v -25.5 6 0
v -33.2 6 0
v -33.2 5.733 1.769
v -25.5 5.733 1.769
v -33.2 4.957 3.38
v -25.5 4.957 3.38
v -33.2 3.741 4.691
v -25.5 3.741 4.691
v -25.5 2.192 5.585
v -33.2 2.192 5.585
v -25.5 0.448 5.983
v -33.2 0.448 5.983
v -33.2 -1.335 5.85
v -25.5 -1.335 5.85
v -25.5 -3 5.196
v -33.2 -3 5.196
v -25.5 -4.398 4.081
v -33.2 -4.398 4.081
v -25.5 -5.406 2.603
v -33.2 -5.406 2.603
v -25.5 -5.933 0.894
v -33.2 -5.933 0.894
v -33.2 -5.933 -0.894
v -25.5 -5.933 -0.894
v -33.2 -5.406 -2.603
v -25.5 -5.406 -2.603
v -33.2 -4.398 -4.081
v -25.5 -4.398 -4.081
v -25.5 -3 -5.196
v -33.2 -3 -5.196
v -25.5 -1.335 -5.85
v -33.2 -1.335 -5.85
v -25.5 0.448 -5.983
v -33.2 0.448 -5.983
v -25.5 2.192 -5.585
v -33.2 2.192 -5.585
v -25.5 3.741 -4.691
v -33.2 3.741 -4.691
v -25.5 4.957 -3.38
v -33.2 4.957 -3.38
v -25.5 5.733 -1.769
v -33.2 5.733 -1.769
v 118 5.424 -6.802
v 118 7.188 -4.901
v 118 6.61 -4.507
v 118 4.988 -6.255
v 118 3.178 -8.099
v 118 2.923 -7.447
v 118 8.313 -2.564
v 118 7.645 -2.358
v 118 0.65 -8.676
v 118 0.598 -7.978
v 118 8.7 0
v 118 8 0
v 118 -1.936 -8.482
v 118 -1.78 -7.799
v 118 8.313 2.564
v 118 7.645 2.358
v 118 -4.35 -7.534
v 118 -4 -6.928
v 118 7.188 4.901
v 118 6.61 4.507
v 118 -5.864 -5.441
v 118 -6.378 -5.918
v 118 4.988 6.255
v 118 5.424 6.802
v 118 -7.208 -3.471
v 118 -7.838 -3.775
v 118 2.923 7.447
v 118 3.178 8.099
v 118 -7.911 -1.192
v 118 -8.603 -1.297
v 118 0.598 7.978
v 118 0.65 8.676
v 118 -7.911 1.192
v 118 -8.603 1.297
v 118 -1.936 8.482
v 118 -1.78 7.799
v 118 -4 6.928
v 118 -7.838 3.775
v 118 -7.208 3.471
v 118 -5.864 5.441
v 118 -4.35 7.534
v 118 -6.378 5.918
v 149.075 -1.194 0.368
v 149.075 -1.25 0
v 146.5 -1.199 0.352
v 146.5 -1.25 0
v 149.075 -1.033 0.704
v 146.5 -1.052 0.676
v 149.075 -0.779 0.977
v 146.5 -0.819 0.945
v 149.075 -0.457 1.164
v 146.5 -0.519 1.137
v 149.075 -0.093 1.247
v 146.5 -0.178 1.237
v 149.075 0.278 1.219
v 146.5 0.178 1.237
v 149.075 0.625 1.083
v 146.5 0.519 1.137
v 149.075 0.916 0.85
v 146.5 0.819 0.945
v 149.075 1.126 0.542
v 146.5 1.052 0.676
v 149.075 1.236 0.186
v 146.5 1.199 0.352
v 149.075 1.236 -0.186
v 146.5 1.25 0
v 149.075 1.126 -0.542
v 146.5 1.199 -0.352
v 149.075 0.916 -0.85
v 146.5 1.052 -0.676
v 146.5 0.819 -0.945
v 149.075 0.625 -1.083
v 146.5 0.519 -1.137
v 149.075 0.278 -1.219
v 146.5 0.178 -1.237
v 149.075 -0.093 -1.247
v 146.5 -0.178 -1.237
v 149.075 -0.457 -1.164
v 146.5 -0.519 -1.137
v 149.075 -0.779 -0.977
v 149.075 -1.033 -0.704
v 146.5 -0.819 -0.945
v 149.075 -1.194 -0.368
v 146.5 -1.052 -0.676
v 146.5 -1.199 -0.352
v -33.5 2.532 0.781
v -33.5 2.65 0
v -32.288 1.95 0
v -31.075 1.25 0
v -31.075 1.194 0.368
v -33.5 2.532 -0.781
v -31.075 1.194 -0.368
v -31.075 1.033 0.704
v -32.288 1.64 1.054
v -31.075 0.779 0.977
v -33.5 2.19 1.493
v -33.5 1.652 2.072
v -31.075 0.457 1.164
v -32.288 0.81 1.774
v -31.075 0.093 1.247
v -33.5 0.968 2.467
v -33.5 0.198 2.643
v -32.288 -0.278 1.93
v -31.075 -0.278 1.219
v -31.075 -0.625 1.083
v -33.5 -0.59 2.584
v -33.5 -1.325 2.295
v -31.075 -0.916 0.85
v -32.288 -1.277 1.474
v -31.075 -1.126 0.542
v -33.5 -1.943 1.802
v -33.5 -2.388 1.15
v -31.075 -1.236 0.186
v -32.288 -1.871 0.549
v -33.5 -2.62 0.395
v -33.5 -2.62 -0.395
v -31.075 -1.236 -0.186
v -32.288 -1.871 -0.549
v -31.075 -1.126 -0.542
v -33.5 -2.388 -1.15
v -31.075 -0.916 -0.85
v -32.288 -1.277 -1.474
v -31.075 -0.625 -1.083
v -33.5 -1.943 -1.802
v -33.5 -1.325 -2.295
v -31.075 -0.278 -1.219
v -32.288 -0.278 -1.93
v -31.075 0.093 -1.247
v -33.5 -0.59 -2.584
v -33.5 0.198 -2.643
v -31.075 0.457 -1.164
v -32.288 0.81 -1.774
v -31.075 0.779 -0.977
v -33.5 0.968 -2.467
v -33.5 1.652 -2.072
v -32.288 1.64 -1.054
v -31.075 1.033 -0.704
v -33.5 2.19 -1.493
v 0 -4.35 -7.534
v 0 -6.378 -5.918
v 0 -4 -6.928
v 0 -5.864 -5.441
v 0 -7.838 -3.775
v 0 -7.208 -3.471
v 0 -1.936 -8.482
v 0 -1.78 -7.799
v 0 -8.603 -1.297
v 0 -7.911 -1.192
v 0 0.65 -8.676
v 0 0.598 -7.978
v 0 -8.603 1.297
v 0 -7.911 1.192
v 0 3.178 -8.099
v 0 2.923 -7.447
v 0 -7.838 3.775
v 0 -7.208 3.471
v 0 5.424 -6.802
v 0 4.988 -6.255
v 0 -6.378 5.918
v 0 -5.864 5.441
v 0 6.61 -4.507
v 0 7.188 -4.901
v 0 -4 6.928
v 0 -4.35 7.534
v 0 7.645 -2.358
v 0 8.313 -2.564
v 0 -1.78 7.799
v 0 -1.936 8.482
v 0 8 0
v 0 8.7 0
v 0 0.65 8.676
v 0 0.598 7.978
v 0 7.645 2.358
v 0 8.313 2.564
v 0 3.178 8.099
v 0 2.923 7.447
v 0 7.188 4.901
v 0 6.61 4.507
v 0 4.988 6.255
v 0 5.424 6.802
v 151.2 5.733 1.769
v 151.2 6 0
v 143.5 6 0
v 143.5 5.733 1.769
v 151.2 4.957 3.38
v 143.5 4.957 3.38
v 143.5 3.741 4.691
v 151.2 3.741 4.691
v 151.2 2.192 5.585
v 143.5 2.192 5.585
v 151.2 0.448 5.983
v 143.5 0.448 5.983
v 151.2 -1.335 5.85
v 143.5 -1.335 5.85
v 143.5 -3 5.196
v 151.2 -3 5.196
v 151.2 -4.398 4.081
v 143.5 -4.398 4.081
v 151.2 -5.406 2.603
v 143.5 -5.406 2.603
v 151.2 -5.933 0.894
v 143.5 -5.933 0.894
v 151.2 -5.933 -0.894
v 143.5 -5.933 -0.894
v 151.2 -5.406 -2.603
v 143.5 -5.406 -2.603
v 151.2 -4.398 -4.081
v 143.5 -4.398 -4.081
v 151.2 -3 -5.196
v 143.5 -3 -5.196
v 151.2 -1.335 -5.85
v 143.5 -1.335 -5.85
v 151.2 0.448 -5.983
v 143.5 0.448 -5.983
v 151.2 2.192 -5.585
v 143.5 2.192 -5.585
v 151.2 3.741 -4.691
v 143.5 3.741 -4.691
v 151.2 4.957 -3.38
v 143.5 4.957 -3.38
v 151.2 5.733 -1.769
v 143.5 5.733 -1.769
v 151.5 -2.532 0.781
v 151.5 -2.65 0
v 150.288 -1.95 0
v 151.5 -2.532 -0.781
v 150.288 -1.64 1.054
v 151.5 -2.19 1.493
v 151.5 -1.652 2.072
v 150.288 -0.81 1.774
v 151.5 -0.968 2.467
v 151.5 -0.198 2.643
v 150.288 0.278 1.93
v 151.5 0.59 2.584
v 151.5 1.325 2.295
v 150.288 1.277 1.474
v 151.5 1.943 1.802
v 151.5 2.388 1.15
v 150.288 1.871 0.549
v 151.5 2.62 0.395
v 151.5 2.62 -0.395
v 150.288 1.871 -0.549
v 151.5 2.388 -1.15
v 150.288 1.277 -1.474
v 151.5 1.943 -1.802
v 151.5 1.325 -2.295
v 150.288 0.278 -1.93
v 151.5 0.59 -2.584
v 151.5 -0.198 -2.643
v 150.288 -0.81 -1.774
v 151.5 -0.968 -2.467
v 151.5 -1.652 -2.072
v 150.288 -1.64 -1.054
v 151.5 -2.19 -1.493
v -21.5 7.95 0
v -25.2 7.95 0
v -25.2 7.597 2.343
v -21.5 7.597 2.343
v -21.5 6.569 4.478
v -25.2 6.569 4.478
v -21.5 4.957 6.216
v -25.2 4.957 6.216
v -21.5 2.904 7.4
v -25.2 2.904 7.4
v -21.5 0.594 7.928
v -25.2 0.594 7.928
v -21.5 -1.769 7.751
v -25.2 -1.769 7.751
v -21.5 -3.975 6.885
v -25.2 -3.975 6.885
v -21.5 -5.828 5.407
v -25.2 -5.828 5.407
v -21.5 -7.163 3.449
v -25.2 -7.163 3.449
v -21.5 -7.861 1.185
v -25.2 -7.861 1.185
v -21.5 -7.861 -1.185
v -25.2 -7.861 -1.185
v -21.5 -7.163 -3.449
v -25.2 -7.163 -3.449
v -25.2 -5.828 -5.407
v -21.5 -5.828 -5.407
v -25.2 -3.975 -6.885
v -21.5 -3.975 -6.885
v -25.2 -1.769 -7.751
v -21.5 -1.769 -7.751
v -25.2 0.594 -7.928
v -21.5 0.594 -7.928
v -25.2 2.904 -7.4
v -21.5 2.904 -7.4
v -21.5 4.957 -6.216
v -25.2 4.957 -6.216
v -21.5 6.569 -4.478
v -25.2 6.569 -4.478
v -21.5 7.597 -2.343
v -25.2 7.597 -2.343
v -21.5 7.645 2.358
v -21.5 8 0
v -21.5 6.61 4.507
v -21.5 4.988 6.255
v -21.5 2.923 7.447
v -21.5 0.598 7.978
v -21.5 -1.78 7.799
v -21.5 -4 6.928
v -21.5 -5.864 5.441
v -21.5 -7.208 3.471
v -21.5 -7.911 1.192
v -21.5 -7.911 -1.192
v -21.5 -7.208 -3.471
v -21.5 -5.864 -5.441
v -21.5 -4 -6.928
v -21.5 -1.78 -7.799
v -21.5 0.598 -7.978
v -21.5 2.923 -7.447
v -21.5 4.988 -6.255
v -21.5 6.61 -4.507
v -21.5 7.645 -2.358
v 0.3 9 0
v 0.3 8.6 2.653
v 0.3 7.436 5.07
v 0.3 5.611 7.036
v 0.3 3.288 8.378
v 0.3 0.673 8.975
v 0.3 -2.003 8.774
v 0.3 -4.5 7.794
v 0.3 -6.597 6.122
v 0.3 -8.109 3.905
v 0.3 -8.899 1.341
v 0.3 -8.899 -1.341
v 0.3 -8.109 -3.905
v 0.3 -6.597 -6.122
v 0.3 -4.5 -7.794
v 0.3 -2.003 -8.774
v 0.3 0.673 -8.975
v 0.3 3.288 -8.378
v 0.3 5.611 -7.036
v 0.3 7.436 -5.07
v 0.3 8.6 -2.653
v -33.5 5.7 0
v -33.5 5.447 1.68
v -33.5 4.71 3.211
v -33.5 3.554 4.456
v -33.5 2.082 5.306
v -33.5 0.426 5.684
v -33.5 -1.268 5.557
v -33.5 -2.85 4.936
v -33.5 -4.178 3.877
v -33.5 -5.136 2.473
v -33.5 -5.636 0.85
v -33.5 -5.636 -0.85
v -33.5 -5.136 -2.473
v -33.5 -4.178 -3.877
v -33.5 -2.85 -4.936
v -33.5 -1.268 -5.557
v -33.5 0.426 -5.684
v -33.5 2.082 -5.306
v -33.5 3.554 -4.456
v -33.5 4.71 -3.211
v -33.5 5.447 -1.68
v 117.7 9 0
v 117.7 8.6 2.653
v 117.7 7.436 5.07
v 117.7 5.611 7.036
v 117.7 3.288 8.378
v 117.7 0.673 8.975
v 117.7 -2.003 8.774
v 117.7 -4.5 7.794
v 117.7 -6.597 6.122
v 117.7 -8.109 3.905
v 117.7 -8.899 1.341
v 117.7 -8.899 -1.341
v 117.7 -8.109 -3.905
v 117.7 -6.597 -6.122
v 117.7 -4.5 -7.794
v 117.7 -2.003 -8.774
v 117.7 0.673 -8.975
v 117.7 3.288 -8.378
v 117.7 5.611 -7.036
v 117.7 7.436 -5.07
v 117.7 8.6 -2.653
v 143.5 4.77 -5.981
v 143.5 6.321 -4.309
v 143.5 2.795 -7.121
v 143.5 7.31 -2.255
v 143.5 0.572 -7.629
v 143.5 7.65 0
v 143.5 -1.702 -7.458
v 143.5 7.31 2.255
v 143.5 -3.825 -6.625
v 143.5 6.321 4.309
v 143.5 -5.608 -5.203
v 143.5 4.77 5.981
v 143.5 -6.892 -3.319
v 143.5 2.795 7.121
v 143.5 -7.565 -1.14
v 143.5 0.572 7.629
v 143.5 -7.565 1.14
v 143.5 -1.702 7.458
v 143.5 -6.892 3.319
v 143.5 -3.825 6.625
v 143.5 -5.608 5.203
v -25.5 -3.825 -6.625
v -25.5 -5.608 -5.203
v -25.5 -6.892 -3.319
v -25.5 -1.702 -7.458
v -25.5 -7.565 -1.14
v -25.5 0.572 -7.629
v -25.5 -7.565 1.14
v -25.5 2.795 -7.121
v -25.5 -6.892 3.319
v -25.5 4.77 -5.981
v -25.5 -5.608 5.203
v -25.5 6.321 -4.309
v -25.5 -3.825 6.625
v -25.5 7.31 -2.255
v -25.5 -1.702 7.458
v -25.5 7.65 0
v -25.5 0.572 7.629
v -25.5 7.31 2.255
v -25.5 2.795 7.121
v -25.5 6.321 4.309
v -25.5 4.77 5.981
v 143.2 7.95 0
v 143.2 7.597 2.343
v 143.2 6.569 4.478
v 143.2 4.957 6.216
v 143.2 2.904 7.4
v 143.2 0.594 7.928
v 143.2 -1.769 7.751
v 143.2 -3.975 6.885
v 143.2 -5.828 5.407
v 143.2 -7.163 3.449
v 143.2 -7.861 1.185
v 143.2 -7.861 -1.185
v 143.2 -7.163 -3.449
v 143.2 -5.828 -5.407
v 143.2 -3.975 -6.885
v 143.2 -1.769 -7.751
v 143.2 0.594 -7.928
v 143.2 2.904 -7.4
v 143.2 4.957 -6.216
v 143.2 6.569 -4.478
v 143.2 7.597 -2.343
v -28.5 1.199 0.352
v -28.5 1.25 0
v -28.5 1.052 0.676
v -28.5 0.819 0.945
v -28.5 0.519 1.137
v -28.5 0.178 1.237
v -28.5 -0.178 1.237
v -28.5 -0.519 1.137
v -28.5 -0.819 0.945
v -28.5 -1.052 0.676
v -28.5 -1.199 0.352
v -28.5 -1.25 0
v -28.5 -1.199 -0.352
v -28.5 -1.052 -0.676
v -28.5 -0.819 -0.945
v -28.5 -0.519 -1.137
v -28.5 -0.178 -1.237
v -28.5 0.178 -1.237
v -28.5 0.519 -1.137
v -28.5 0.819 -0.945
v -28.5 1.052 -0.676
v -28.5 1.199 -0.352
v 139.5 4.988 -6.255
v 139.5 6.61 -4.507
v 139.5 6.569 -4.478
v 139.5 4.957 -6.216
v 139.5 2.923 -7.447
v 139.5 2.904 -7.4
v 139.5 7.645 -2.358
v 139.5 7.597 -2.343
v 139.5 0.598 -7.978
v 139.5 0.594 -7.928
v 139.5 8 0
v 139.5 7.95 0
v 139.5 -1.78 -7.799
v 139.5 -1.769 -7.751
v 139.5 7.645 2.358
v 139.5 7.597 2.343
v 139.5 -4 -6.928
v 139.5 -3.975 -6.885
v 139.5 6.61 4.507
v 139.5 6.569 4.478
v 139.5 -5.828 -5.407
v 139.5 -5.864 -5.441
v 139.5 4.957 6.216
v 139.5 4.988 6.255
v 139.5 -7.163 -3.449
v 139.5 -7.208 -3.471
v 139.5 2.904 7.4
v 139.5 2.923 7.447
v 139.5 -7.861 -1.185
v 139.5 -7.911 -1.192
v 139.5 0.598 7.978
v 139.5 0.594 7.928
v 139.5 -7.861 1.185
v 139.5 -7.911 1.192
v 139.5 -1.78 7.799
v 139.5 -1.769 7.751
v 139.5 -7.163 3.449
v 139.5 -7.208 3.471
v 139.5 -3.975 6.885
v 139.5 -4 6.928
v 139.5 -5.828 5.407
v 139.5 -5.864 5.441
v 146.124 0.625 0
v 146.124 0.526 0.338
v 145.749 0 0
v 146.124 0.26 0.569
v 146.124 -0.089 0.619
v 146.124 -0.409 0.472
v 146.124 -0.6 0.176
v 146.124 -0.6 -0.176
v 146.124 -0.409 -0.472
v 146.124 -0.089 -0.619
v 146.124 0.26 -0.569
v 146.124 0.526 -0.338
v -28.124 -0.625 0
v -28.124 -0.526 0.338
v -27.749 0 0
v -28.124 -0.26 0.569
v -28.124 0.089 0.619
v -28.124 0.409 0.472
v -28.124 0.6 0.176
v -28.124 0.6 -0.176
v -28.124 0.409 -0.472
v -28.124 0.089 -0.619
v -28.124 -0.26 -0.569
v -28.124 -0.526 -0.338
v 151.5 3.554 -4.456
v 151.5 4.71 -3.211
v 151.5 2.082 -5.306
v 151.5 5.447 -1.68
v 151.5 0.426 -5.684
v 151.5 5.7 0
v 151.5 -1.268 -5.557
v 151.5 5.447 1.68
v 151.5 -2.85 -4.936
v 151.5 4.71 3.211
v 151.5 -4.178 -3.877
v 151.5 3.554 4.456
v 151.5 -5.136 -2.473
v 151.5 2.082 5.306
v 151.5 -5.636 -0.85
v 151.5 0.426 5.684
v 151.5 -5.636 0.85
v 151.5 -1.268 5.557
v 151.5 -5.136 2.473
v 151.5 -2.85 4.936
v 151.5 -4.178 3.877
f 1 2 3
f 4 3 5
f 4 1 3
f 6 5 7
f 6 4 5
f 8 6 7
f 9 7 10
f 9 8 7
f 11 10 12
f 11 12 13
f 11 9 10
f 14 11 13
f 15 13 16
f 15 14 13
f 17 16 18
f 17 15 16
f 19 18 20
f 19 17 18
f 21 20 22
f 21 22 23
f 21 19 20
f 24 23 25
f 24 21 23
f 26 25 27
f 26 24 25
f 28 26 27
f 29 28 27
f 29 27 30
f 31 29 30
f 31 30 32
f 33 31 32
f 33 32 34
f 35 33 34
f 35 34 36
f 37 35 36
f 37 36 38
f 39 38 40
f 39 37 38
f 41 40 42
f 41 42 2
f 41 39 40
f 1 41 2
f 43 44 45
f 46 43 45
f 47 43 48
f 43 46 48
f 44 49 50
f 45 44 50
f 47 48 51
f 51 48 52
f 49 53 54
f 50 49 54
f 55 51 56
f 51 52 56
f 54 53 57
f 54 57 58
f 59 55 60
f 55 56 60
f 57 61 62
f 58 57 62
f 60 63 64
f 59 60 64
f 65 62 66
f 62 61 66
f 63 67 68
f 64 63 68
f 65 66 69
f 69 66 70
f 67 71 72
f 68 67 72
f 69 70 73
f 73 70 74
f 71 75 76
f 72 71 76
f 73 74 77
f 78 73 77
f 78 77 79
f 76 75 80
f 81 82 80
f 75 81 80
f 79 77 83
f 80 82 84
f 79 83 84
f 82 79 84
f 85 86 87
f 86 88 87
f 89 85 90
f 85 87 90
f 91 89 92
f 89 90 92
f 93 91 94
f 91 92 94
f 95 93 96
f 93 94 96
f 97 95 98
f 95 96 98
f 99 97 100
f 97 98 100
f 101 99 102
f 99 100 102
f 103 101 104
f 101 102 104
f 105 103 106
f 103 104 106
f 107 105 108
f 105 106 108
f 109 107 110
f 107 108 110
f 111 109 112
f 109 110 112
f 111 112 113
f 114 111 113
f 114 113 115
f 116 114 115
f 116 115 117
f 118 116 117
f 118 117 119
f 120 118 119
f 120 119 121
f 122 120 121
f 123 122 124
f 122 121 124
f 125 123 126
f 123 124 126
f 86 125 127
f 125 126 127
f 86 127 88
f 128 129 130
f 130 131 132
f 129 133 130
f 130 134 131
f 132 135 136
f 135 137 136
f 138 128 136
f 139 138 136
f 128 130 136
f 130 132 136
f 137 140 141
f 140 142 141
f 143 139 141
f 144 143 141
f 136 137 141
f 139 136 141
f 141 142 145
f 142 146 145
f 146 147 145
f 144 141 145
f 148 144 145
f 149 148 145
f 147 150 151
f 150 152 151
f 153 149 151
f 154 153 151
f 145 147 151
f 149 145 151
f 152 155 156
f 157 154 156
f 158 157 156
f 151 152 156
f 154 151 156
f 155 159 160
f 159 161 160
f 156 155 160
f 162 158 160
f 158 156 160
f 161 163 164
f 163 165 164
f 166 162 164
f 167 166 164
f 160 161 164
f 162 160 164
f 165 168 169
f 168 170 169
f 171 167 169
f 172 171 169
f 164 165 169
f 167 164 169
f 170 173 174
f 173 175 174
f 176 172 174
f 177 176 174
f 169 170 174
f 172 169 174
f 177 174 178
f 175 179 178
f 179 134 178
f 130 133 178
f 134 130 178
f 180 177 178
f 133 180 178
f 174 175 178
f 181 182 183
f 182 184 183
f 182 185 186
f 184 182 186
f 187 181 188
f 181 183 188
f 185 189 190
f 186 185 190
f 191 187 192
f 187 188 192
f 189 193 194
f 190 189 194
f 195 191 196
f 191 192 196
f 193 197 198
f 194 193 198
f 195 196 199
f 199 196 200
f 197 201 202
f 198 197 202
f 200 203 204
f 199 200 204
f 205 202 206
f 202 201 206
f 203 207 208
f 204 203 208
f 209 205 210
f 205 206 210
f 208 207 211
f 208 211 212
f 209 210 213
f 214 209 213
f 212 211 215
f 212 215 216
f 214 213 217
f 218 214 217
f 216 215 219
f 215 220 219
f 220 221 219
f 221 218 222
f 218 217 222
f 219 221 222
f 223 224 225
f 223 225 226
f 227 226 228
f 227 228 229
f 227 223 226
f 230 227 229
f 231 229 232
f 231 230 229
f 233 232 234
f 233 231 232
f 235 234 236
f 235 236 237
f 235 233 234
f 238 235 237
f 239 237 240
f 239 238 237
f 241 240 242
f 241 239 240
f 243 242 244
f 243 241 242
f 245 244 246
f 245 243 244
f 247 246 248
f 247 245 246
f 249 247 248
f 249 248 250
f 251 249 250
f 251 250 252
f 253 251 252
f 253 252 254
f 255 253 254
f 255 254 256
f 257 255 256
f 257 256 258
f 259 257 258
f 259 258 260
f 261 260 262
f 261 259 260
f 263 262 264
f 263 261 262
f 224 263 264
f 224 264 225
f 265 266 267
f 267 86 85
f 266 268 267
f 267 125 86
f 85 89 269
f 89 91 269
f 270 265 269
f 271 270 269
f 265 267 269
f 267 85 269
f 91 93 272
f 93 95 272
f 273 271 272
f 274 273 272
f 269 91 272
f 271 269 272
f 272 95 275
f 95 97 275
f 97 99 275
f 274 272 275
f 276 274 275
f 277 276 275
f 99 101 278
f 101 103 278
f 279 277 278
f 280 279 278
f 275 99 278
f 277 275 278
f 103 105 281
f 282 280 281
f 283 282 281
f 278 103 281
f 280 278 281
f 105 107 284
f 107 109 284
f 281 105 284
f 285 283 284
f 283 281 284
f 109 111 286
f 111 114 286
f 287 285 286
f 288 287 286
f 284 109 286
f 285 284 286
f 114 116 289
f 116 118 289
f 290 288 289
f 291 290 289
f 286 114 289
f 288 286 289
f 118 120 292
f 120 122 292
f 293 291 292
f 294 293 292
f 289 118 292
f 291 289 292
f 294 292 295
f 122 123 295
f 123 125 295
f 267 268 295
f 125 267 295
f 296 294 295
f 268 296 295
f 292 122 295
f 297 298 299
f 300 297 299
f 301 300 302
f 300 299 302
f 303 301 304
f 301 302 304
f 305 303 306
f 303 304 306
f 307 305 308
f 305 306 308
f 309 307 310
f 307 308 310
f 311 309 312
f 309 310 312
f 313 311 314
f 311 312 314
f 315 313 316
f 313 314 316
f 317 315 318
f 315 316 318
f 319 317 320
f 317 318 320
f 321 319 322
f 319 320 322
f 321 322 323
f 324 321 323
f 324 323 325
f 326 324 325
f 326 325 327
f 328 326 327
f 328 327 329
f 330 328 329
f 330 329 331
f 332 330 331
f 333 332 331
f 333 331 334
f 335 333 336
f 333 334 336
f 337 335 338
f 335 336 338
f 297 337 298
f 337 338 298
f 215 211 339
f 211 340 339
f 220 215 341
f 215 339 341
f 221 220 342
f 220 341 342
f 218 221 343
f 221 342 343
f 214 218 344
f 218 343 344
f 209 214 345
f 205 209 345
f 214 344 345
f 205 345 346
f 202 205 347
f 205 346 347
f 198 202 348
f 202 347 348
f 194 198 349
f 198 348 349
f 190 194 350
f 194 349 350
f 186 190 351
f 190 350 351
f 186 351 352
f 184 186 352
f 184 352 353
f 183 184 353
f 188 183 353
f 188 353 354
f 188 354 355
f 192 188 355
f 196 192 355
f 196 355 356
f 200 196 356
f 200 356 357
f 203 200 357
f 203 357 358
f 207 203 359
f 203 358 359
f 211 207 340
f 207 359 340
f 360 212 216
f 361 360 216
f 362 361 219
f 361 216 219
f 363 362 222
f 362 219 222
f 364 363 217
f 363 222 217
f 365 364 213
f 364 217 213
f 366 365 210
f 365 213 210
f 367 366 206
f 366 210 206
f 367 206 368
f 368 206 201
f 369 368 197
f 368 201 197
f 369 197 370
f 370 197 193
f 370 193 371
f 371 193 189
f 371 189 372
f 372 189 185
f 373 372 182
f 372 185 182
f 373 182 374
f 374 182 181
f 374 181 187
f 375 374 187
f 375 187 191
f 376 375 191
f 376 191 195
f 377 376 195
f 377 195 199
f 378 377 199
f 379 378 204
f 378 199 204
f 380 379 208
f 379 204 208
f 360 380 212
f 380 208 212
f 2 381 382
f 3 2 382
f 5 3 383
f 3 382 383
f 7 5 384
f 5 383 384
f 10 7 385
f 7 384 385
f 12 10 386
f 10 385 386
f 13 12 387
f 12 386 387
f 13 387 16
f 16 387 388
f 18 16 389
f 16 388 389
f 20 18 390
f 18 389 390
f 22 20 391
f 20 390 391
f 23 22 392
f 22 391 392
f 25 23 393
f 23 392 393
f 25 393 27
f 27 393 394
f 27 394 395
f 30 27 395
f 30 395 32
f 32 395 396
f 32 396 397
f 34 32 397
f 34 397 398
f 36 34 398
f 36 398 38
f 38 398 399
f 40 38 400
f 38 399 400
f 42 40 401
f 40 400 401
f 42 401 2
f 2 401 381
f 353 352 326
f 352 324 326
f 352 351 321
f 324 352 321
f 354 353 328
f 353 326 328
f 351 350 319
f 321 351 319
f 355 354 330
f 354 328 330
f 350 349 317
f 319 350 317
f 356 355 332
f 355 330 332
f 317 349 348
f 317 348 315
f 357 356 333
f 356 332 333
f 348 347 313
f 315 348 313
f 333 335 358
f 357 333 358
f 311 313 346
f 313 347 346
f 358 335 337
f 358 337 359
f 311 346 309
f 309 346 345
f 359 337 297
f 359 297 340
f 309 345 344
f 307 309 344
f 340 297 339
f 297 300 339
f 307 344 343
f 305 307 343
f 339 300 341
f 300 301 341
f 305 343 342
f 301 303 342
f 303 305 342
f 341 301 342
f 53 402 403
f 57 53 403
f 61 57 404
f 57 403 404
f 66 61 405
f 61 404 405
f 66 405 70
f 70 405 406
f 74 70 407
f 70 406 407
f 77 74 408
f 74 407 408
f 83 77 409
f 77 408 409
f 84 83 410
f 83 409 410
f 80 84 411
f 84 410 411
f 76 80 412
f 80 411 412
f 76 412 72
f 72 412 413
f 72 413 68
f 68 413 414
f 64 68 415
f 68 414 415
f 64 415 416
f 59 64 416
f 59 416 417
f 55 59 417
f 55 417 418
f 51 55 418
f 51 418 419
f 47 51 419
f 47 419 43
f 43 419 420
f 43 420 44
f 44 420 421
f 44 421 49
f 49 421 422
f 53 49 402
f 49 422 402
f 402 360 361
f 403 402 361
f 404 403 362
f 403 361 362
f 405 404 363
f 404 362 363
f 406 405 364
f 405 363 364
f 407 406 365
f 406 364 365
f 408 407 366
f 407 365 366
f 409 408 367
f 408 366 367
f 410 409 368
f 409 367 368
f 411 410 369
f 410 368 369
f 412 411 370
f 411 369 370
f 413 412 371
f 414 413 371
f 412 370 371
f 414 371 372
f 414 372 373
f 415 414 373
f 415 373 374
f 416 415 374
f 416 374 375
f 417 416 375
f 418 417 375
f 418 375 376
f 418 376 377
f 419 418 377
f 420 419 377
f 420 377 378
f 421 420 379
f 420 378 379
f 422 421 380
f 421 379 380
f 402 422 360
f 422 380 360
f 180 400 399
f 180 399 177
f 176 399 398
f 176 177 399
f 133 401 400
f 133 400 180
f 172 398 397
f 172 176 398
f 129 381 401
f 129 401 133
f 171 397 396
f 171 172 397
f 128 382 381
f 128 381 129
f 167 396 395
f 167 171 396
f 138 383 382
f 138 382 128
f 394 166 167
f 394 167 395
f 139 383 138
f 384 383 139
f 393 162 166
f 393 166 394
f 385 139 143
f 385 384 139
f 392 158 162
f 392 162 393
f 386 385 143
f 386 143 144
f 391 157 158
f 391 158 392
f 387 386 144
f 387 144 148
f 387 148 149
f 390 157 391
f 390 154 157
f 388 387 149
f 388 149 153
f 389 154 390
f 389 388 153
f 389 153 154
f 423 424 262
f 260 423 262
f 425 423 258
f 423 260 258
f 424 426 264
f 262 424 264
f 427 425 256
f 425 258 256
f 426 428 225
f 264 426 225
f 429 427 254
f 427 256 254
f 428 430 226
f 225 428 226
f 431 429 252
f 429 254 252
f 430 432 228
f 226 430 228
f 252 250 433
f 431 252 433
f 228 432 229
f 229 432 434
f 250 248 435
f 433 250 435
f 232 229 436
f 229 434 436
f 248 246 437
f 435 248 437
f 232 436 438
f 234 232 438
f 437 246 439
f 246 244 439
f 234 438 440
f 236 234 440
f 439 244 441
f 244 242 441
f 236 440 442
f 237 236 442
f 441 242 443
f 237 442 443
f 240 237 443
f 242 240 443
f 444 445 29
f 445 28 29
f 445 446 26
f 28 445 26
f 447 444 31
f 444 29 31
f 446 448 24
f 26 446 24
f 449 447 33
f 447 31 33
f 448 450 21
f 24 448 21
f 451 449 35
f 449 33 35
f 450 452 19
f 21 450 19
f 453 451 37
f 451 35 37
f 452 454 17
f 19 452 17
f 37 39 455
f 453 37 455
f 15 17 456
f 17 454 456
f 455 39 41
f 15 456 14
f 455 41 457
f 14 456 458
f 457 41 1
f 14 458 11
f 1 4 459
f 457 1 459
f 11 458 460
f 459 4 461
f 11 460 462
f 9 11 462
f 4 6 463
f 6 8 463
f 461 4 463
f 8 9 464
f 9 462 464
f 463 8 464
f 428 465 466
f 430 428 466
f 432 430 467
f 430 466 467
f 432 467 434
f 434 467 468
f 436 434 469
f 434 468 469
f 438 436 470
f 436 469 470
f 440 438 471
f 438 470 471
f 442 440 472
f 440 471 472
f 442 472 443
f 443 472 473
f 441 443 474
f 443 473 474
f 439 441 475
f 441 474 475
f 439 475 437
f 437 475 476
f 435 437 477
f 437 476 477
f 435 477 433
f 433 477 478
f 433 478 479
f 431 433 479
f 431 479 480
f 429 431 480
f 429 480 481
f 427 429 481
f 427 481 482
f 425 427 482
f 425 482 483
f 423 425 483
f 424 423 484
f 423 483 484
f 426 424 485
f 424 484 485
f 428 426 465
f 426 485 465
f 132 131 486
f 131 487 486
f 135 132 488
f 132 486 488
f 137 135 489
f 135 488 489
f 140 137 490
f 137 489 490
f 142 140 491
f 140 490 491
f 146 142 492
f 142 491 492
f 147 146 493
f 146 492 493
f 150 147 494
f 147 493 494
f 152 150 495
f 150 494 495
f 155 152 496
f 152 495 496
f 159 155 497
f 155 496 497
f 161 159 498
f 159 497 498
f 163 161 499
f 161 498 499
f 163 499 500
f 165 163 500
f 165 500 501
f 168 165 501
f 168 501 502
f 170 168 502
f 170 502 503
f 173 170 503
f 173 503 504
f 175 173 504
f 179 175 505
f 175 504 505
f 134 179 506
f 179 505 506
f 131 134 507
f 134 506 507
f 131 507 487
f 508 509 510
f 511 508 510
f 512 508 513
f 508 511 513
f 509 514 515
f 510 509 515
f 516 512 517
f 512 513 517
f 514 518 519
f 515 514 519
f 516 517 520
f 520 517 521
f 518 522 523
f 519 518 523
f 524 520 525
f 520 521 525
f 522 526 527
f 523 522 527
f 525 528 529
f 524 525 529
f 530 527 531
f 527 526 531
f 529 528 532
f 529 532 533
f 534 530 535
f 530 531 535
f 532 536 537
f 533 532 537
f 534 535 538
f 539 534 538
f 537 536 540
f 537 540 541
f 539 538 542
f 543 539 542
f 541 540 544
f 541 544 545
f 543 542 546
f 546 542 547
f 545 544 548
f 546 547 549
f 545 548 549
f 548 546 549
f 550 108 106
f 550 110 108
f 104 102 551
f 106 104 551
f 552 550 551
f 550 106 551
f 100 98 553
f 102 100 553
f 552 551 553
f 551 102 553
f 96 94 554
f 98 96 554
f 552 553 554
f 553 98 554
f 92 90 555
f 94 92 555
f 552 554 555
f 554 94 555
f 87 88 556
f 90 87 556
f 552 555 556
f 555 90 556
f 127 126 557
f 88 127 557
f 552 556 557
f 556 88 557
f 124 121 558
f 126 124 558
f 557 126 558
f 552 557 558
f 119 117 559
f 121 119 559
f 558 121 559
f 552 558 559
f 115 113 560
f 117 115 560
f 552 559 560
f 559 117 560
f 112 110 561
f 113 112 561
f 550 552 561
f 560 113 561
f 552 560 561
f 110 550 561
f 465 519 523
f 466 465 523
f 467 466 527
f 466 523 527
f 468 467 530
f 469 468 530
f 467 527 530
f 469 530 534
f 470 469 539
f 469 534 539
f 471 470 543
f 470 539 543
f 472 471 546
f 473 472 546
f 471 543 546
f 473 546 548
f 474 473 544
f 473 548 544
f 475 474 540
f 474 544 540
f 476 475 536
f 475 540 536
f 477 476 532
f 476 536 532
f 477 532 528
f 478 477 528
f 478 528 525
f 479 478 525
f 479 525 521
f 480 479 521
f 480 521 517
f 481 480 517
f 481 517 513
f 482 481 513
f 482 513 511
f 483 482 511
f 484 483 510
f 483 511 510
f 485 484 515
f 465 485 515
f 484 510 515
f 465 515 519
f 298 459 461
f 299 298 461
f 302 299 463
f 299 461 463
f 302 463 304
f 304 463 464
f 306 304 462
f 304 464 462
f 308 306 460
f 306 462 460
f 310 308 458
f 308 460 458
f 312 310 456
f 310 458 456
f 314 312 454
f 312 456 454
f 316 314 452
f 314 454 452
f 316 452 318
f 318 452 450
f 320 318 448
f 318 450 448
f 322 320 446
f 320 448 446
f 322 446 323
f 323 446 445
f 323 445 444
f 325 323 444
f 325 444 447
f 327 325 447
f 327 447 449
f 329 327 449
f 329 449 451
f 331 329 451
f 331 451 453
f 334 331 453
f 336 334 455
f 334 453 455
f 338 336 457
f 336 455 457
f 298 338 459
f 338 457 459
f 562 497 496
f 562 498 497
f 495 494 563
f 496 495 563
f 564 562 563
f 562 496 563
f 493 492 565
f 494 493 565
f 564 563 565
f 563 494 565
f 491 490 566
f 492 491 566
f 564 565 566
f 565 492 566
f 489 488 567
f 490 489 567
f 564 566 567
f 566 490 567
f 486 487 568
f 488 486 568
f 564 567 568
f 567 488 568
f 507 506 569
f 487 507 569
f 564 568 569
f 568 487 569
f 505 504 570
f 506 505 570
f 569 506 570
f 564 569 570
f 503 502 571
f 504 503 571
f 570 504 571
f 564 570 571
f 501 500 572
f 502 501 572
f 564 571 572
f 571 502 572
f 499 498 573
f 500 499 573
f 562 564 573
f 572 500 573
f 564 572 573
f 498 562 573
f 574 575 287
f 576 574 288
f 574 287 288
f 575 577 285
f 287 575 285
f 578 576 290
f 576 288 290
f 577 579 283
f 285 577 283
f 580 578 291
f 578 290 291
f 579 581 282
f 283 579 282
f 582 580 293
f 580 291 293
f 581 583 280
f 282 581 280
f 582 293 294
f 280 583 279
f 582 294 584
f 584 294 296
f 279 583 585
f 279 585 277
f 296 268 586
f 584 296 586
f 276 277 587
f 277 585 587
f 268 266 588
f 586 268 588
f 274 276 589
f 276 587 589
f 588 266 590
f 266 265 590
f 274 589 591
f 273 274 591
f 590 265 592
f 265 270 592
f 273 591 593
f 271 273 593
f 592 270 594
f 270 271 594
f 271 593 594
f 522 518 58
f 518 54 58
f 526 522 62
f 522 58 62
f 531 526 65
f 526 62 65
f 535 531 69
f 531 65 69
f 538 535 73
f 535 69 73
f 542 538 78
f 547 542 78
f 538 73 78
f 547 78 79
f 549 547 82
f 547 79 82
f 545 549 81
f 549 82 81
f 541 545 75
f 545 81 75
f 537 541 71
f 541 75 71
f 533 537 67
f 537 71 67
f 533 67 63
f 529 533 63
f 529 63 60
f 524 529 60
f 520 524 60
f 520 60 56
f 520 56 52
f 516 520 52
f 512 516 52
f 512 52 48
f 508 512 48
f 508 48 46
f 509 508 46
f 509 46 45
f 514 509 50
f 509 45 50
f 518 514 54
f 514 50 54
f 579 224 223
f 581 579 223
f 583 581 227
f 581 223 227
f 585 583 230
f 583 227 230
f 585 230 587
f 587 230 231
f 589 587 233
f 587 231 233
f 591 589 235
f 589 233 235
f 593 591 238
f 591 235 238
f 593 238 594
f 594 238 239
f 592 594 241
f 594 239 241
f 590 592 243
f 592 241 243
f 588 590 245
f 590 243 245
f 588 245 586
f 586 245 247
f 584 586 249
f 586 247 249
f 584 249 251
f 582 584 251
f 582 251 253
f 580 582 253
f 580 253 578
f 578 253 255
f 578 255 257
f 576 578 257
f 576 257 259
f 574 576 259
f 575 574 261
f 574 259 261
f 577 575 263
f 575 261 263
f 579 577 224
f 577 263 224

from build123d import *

# Parameters (mm, degrees)
F0_W                 = 8
F0_H                 = 6
F2_SIZE              = 0.3
F5_D                 = 2.5
F5_DEPTH             = 5
F5_CSINK_D           = 5.3
F5_CSINK_ANGLE       = 60
F5_TIP               = 0.7510757738
F5_ON_F4_D           = 2.5
F5_ON_F4_DEPTH       = 5
F5_ON_F4_CSINK_D     = 5.3
F5_ON_F4_CSINK_ANGLE = 60
F5_ON_F4_TIP         = 0.7510757738


with BuildPart() as f1:
    # F0 (on Top) → F1 (revolve)
    with BuildSketch(Plane.XY):
        with Locations((147.5, 3)):
            Rectangle(F0_W, F0_H)
        Polygon((139.5, 7.95), (139.5, 0), (143.5, 0), (143.5, 6), (143.5, 7.95), align=None)
        Polygon((118, 8), (118, 0), (139.5, 0), (139.5, 7.95), (139.5, 8), align=None)
        Polygon((0, 8), (0, 0), (118, 0), (118, 8), (118, 9), (0, 9), align=None)
        Polygon((-21.5, 0), (0, 0), (0, 8), (-21.5, 8), (-21.5, 7.95), align=None)
        Polygon((-25.5, 0), (-21.5, 0), (-21.5, 7.95), (-25.5, 7.95), (-25.5, 6), align=None)
        with Locations((-29.5, 3)):
            Rectangle(F0_W, F0_H)
    revolve(axis=Axis((59, 0, 0), (1, 0, 0)))

    # F2
    f2_edges = [f1.edges().sort_by_distance(p)[0] for p in [
        (151.5, -6, 0),
        (143.5, -7.95, 0),
        (118, -9, 0),
        (0, -9, 0),
        (-25.5, -7.95, 0),
        (-33.5, -6, 0),
    ]]
    chamfer(f2_edges, length=F2_SIZE)

    # F5
    with Locations(Plane(origin=(-33.5, 0, 0), x_dir=(0, -1, 0), z_dir=(-1, 0, 0))):
        with Locations((0, 0)):
            CounterSinkHole(F5_D / 2, F5_CSINK_D / 2, depth=F5_DEPTH, counter_sink_angle=F5_CSINK_ANGLE)
            with Locations((0, 0, -(F5_DEPTH + F5_TIP / 2))):  # 118° drill point
                Cone(0, F5_D / 2, F5_TIP, mode=Mode.SUBTRACT)

    # F5 on F4
    with Locations(Plane.YZ.offset(151.5)):
        with Locations((0, 0)):
            CounterSinkHole(F5_ON_F4_D / 2, F5_ON_F4_CSINK_D / 2, depth=F5_ON_F4_DEPTH, counter_sink_angle=F5_ON_F4_CSINK_ANGLE)
            with Locations((0, 0, -(F5_ON_F4_DEPTH + F5_ON_F4_TIP / 2))):  # 118° drill point
                Cone(0, F5_ON_F4_D / 2, F5_ON_F4_TIP, mode=Mode.SUBTRACT)


solid = f1.part
